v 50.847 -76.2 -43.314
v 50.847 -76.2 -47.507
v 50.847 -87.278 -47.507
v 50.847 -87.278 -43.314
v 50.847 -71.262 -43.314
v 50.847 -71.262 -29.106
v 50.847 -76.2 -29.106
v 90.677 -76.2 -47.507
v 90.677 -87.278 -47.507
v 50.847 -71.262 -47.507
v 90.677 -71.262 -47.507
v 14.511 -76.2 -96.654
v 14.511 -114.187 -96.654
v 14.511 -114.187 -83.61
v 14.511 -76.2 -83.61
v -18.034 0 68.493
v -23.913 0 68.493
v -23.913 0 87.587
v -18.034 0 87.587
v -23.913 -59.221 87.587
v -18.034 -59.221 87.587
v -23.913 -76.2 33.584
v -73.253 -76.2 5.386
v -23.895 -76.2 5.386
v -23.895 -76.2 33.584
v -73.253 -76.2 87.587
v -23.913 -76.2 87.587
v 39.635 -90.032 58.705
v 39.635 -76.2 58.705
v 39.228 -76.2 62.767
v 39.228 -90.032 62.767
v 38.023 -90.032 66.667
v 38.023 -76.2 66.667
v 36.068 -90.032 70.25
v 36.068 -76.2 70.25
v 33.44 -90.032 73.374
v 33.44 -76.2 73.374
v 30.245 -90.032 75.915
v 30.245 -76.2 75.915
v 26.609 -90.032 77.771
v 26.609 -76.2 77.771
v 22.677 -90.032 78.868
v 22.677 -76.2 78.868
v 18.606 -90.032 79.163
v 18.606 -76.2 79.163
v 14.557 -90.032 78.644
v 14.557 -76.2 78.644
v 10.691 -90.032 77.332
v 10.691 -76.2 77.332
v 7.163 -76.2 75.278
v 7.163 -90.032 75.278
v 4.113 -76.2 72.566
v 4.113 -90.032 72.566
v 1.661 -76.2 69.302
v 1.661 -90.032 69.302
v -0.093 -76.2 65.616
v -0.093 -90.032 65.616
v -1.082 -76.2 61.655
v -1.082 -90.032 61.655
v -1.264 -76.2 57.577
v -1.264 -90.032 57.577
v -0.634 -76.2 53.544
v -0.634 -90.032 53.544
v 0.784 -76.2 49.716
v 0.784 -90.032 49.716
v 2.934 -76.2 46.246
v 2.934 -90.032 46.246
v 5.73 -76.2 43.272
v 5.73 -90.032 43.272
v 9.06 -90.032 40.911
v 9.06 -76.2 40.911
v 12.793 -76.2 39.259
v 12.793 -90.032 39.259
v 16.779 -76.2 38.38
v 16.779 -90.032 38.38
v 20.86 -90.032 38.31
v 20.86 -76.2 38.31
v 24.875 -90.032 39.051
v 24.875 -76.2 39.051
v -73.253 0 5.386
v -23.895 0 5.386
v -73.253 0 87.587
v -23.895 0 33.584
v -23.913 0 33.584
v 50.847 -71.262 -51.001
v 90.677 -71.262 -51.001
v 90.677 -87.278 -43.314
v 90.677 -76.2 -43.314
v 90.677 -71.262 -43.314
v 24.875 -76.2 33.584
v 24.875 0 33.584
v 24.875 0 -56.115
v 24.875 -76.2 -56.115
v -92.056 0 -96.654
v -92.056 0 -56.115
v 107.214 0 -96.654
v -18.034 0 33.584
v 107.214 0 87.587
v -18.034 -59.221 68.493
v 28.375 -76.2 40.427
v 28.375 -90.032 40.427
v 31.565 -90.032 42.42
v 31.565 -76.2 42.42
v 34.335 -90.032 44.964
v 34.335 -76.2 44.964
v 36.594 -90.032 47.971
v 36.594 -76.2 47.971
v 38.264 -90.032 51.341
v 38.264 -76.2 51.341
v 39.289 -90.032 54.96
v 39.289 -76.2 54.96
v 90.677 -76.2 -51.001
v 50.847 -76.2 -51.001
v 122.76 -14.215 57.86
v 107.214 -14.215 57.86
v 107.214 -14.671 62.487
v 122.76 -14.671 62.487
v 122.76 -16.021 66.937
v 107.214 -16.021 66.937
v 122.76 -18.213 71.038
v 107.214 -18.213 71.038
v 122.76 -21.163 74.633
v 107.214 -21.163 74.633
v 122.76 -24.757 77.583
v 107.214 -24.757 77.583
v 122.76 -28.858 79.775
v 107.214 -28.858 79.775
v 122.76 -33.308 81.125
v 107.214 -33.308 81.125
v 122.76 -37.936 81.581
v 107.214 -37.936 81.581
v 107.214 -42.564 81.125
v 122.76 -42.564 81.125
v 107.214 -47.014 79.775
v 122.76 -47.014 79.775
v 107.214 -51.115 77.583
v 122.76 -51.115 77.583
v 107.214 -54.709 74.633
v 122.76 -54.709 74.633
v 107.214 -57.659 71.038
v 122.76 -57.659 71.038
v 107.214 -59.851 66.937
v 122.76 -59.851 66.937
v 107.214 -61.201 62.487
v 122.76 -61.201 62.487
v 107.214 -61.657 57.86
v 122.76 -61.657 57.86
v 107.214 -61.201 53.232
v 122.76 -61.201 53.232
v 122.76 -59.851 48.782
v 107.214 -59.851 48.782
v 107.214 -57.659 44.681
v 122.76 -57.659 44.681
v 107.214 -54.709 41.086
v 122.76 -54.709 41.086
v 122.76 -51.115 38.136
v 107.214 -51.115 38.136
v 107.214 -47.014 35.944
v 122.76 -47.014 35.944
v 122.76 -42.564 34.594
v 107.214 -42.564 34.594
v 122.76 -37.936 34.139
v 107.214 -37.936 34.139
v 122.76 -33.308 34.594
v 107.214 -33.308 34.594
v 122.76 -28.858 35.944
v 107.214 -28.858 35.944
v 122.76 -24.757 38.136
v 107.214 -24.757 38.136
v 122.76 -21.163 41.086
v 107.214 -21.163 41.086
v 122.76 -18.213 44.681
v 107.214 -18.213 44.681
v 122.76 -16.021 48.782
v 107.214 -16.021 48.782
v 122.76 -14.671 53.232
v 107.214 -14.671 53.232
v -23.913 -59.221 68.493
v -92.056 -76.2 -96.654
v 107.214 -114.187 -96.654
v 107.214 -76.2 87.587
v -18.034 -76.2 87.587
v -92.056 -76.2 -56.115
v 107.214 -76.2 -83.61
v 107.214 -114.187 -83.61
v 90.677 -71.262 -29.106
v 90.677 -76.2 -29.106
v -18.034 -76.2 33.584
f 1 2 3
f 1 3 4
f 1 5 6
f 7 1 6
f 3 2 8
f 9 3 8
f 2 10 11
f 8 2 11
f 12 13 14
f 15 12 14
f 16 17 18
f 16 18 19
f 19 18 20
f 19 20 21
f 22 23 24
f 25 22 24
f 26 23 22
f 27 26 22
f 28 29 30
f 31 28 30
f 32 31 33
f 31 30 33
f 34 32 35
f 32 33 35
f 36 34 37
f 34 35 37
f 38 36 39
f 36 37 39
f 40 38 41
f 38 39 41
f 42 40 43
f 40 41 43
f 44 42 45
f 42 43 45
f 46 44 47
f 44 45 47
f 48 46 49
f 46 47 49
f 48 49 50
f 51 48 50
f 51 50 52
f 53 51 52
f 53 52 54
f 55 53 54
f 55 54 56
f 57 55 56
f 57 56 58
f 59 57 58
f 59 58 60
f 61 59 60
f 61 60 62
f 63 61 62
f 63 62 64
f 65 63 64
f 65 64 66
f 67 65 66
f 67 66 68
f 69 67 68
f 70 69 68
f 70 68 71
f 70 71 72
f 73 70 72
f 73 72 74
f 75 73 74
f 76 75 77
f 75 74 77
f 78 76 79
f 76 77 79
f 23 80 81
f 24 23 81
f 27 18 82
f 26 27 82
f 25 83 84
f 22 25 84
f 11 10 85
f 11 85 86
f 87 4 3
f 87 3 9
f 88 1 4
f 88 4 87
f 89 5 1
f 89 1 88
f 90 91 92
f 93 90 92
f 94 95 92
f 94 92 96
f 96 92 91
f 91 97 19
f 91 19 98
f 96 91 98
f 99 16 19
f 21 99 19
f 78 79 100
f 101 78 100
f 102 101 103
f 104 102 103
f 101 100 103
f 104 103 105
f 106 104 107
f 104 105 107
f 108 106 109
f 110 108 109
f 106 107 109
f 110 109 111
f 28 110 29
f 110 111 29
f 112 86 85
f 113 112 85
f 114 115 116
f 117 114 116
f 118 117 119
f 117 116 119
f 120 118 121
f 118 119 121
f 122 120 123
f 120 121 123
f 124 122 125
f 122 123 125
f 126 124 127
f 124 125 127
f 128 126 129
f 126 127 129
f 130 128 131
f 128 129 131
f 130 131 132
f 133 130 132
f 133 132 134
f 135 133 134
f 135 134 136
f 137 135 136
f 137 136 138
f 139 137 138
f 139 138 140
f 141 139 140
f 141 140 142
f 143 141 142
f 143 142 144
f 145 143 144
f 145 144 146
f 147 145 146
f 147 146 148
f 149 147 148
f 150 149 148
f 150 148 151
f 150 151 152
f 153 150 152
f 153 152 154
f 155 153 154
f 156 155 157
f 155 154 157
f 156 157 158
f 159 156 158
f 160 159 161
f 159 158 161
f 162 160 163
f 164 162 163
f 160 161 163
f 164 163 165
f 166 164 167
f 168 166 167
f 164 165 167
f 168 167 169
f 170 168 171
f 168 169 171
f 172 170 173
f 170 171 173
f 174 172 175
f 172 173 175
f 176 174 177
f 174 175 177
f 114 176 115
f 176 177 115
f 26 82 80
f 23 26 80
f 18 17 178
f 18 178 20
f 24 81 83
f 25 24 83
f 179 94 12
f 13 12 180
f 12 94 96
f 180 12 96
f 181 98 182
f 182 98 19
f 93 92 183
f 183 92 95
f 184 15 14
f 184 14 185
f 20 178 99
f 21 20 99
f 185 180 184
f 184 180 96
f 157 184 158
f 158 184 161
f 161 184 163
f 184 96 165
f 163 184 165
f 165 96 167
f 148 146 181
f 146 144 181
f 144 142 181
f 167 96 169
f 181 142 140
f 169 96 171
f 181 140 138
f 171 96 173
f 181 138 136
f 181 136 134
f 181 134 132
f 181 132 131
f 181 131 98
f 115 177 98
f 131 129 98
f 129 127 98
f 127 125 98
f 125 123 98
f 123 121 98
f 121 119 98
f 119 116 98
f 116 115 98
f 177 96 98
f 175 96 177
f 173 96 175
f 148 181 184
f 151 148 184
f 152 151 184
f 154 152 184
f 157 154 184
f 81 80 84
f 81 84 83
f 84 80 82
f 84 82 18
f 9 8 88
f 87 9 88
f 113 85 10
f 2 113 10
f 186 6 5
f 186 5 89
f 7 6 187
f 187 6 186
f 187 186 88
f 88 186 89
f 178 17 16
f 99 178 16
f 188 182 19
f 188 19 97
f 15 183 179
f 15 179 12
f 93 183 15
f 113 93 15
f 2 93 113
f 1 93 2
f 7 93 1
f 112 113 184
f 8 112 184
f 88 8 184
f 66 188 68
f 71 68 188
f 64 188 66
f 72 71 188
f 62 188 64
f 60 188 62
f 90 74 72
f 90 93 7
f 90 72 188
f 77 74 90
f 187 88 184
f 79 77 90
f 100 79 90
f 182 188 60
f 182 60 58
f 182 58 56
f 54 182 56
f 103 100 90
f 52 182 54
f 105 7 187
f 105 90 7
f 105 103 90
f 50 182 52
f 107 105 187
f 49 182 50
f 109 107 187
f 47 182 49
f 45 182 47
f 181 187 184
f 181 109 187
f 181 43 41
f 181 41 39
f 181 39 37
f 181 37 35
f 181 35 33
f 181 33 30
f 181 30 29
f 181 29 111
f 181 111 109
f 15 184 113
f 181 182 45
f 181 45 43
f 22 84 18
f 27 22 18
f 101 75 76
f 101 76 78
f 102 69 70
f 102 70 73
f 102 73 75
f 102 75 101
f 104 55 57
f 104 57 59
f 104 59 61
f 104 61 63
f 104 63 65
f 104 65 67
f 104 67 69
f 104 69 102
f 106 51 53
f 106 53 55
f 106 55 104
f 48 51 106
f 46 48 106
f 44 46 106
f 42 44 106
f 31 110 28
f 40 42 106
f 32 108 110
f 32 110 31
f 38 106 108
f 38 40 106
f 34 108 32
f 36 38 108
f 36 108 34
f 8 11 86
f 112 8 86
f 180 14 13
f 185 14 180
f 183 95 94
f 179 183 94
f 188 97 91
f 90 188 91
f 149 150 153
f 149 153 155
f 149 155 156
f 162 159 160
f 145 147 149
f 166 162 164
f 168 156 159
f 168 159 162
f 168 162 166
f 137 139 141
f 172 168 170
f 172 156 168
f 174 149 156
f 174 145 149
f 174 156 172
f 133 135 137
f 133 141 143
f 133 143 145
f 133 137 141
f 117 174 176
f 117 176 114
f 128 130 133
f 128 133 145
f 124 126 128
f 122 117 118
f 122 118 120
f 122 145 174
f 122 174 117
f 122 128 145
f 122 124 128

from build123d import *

# Parameters (mm, degrees)
F2_DEPTH = 76.2
F3_DEPTH = 90.03188
F0_W     = 39.8295894265
F0_H     = 14.2082143575
F0_H_2   = 3.4938193858
F4_DEPTH = 71.26206
F0_H_3   = 4.1925944388
F5_DEPTH = 87.27823
F0_W_2   = 92.7027892321
F0_H_4   = 13.0436122417
F6_DEPTH = 114.18662
F0_W_3   = 5.8787036687
F0_H_5   = 19.0941914916
F7_DEPTH = 59.22076
F1_R     = 23.7210403161
F8_DEPTH = 122.76001


with BuildPart() as f2:
    # F0 (on Front) → F2 (new body)
    with BuildSketch(Plane.XZ):
        Polygon((-73.2527300715, 87.5874310732), (-73.2527300715, 5.3862300701), (-23.8952767104, 5.3862300701), (-23.8952767104, 33.5842727341), (-23.9131078124, 33.5842727341), (-23.9131078124, 68.4932395816), (-23.9131078124, 87.5874310732), align=None)
    extrude(amount=F2_DEPTH)


with BuildPart() as f2b:
    # F0 (on Front) → F2, piece 2 (new body)
    with BuildSketch(Plane.XZ):
        Polygon((-18.0344041437, 68.4932395816), (-18.0344041437, 33.5842727341), (24.8745921999, 33.5842727341), (24.8745921999, -56.1147257686), (-92.0555666089, -56.1147257686), (-92.0555666089, -96.6535285115), (14.5113263279, -96.6535285115), (14.5113263279, -83.6099162698), (107.2141155601, -83.6099162698), (107.2141155601, 87.5874310732), (-18.0344041437, 87.5874310732), align=None)
        Polygon((90.6766802073, -51.0009080172), (50.8470907807, -51.0009080172), (50.8470907807, -47.5070886314), (50.8470907807, -43.3144941926), (50.8470907807, -29.1062798351), (90.6766802073, -29.1062798351), (90.6766802073, -43.3144941926), (90.6766802073, -47.5070886314), align=None, mode=Mode.SUBTRACT)
        with BuildLine():
            ThreePointArc((39.6350706735, 58.7051510811), (35.5340520557, 46.4153622337), (24.8745921999, 39.0510442613))
            ThreePointArc((24.8745921999, 39.0510442613), (2.8054622296, 70.9949399285), (39.6350706735, 58.7051510811))
        make_face(mode=Mode.SUBTRACT)
    extrude(amount=F2_DEPTH)

    # F0 (on Front) → F3 (join)
    with BuildSketch(Plane.XZ):
        with BuildLine():
            ThreePointArc((39.6350706735, 58.7051510811), (2.8054622296, 70.9949399285), (24.8745921999, 39.0510442613))
            ThreePointArc((24.8745921999, 39.0510442613), (35.5340520557, 46.4153622337), (39.6350706735, 58.7051510811))
        make_face()
    extrude(amount=F3_DEPTH)

    # F0 (on Front) → F4 (join)
    with BuildSketch(Plane.XZ):
        with Locations((70.761885494, -36.2103870139)):
            Rectangle(F0_W, F0_H)
        with Locations((70.761885494, -49.2539983243)):
            Rectangle(F0_W, F0_H_2)
    extrude(amount=F4_DEPTH)

    # F0 (on Front) → F5 (join)
    with BuildSketch(Plane.XZ):
        with Locations((70.761885494, -45.410791412)):
            Rectangle(F0_W, F0_H_3)
    extrude(amount=F5_DEPTH)

    # F0 (on Front) → F6 (join)
    with BuildSketch(Plane.XZ):
        with Locations((60.862720944, -90.1317223907)):
            Rectangle(F0_W_2, F0_H_4)
    extrude(amount=F6_DEPTH)

    # F1 (on Right) → F8 (join)
    with BuildSketch(Plane.YZ):
        with Locations((-37.9360765219, 57.8596889973)):
            Circle(F1_R)
    extrude(amount=F8_DEPTH)


with BuildPart() as f7:
    # F0 (on Front) → F7 (new body)
    with BuildSketch(Plane.XZ):
        with Locations((-20.973755978, 78.0403353274)):
            Rectangle(F0_W_3, F0_H_5)
    extrude(amount=F7_DEPTH)


solid = Compound([f2.part, f2b.part, f7.part])
